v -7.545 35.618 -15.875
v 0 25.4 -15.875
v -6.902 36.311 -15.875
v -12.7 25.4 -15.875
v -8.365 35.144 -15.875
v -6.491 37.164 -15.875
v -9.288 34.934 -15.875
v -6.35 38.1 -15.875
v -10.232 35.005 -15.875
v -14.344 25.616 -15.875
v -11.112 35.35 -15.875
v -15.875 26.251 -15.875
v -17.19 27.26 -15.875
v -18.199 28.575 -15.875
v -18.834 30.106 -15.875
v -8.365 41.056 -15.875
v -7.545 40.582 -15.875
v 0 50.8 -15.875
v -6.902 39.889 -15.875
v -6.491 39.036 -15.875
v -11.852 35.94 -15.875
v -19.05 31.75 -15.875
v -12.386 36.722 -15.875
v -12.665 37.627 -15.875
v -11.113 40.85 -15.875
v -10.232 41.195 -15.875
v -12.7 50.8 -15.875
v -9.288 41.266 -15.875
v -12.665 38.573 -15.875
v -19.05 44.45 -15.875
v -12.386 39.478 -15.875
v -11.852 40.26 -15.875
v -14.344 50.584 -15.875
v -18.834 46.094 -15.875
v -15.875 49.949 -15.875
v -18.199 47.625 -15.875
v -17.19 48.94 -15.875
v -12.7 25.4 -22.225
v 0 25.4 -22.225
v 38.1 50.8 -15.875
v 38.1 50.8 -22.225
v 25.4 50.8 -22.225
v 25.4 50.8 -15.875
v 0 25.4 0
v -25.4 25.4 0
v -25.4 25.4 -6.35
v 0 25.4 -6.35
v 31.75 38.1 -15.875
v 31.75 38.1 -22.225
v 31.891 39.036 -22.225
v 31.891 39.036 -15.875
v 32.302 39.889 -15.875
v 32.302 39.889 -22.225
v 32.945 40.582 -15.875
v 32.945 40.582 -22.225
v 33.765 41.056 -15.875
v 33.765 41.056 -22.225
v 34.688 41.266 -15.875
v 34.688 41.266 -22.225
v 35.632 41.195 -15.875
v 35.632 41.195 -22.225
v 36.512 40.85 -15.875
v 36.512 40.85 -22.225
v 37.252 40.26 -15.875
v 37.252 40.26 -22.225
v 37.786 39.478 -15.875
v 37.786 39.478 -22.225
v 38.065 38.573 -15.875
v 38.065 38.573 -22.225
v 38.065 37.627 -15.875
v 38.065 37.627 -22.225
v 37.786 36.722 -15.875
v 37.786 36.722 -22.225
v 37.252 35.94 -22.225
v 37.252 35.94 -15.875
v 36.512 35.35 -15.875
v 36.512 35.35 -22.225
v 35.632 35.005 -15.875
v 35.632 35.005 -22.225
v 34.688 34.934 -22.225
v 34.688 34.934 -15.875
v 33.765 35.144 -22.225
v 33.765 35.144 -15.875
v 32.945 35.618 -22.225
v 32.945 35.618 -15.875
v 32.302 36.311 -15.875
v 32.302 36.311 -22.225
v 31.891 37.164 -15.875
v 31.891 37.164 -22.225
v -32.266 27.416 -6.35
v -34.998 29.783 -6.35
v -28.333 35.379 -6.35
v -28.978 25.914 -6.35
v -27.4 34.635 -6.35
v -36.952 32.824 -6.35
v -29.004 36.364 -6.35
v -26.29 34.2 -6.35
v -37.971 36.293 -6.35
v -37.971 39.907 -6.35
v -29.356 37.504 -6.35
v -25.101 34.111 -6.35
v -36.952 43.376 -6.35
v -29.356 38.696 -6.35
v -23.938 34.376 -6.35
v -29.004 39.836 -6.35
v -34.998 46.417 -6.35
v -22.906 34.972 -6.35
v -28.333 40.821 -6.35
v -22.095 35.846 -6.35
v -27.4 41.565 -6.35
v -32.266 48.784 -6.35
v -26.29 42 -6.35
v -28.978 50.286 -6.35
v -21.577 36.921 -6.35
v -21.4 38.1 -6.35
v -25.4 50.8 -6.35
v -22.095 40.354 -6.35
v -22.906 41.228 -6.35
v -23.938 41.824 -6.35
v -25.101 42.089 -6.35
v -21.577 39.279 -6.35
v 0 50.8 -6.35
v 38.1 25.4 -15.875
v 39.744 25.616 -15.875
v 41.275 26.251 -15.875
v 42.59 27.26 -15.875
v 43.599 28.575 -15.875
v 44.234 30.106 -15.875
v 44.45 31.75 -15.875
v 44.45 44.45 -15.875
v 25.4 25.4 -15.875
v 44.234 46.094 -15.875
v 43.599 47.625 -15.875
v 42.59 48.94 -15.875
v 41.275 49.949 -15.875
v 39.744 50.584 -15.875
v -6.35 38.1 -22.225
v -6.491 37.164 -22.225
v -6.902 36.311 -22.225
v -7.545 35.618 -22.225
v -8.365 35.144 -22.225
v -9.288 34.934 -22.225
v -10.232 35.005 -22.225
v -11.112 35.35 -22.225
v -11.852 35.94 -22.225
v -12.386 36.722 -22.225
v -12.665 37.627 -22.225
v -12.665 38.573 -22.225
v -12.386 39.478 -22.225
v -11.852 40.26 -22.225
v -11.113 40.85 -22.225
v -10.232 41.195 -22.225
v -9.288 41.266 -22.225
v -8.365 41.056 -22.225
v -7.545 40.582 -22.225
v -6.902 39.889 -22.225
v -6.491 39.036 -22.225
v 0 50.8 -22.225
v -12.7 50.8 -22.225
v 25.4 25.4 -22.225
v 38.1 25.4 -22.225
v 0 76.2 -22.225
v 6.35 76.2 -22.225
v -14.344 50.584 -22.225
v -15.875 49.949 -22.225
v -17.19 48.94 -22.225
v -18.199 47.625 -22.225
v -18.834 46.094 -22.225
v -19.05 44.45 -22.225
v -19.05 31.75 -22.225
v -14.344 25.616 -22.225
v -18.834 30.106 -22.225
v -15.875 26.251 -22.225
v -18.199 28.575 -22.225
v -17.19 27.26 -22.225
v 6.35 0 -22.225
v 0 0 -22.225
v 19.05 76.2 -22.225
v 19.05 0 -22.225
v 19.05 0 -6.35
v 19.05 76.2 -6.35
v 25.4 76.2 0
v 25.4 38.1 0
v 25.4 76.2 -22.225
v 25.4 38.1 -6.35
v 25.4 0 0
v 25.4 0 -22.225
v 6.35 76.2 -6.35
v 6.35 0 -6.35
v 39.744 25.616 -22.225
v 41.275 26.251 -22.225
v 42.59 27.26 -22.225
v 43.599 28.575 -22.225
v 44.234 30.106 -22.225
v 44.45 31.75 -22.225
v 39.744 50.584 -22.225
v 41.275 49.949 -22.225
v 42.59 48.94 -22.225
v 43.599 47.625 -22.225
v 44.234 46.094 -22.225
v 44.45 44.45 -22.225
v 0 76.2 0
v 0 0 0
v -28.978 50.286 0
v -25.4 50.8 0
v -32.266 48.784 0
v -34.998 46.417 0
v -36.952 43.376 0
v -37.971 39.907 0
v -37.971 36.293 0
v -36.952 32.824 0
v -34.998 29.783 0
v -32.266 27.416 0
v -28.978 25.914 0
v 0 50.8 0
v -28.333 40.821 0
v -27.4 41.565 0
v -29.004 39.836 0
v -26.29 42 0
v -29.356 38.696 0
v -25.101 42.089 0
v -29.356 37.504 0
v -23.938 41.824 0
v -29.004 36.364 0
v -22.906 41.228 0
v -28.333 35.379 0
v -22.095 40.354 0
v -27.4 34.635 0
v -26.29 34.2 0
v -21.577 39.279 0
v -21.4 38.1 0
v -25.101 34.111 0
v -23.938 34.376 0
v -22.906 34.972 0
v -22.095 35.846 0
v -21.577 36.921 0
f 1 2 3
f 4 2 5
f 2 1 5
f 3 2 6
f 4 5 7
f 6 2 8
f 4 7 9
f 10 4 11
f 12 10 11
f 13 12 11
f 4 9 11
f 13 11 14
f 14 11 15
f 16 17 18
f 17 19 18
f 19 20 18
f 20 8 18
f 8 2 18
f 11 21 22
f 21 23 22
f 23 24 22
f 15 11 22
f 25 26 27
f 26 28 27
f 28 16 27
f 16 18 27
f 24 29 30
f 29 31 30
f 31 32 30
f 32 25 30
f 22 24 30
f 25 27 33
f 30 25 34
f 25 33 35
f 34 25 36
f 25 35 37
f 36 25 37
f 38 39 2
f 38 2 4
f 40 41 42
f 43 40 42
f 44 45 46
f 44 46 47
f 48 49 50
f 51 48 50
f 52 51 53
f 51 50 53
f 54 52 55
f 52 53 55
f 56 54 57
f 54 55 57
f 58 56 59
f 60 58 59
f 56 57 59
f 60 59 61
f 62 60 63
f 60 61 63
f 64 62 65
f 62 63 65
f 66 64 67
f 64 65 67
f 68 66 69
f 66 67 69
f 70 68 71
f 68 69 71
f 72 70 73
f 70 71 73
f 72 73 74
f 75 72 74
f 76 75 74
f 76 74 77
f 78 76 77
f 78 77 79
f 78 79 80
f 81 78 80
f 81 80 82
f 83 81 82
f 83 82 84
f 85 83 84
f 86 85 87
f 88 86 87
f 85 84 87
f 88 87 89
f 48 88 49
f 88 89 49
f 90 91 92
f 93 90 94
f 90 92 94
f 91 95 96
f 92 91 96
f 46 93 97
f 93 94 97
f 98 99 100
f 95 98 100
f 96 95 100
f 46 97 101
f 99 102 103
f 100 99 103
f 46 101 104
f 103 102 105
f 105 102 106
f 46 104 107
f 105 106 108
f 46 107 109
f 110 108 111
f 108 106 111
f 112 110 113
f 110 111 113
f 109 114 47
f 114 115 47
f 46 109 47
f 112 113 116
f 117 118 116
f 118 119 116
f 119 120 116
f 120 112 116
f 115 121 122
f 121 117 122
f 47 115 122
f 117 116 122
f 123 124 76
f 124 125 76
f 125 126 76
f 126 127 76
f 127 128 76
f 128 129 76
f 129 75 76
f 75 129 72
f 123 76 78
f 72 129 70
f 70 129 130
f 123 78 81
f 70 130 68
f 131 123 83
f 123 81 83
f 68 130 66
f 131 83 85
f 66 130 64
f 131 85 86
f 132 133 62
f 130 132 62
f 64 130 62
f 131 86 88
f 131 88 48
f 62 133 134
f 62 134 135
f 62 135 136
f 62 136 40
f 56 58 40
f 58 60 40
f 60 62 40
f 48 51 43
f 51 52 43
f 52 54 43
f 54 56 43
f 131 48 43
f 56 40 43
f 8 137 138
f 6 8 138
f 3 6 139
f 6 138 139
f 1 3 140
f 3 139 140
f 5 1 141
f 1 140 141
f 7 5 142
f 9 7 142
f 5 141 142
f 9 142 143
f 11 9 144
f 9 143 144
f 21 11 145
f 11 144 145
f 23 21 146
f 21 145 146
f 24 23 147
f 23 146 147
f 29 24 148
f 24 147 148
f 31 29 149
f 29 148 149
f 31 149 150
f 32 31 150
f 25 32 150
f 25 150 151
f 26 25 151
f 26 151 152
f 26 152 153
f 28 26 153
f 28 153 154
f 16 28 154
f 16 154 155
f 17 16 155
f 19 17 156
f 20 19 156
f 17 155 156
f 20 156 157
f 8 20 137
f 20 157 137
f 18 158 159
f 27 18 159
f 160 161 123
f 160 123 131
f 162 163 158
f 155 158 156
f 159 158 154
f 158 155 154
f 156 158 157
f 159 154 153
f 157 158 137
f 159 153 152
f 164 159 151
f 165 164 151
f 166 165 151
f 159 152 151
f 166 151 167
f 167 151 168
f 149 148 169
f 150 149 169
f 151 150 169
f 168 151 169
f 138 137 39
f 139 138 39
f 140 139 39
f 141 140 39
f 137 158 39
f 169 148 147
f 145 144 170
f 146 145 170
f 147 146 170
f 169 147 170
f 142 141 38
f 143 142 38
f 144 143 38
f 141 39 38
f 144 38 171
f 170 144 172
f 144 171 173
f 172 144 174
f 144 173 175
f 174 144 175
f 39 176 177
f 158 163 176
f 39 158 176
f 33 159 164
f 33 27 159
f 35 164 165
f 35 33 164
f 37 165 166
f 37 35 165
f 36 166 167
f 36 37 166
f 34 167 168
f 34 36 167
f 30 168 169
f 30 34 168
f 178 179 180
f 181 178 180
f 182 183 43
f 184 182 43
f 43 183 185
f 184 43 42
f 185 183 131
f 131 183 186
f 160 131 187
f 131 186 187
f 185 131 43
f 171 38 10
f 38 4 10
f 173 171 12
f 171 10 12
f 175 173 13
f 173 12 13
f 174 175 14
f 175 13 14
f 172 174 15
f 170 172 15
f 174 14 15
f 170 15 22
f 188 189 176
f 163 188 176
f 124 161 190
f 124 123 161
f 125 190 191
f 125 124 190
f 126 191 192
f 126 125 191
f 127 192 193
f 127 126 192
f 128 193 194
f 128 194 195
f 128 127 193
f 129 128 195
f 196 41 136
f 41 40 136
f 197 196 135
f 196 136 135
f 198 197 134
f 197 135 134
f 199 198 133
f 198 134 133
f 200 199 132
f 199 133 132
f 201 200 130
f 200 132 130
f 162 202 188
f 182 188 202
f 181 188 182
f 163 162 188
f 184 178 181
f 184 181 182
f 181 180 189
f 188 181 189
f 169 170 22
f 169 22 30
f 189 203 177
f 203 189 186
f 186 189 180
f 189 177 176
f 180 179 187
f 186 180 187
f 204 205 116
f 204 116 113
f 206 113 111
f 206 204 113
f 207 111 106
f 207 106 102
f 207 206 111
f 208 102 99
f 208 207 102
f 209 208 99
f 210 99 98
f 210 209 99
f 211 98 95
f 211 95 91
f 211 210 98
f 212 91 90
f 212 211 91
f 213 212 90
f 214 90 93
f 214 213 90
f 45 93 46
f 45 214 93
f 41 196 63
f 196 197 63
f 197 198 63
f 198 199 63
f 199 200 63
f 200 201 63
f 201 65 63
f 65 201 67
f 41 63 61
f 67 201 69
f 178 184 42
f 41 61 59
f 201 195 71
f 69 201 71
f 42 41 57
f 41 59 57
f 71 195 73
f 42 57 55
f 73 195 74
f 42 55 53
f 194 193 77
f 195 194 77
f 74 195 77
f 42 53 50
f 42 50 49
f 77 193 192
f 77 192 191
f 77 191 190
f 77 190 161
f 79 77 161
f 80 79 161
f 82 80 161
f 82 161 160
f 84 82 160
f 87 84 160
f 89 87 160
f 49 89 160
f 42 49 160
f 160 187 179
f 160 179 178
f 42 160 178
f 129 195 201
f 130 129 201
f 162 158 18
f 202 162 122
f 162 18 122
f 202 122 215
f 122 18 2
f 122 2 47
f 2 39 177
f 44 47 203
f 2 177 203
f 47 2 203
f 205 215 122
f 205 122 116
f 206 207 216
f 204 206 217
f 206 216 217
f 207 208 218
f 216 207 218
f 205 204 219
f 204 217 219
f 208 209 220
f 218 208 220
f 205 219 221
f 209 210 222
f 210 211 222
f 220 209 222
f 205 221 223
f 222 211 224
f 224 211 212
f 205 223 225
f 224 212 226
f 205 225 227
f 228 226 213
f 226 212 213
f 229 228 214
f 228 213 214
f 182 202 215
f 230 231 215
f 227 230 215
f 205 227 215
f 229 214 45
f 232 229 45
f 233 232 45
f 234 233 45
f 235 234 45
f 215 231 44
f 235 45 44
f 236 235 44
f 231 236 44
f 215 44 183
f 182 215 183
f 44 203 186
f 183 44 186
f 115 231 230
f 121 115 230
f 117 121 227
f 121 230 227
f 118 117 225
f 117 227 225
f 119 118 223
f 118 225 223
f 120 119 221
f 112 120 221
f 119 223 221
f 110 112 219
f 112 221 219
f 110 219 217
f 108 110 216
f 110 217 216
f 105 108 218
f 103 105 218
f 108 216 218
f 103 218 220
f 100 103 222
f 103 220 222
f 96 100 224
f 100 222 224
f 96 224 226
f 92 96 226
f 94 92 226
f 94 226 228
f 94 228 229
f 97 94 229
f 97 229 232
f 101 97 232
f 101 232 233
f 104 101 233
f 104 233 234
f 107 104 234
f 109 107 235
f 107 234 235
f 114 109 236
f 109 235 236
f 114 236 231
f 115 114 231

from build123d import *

# Parameters (mm, degrees)
BOSS_EXTRUDE1_DEPTH = 76.2
SKETCH3_R           = 4.0005
BOSS_EXTRUDE2_DEPTH = 6.35
SKETCH4_W           = 19.05
SKETCH4_H           = 25.4
SKETCH4_R           = 3.175
BOSS_EXTRUDE3_DEPTH = 6.35
FILLET1_R           = 6.35


with BuildPart() as part:
    # Sketch2 → Boss-Extrude1 (new body)
    with BuildSketch(Plane(origin=(0, 0, 0), x_dir=(1, 0, 0), z_dir=(0, 1, 0))):
        Polygon((0, 22.225), (0, 0), (25.4, 0), (25.4, 22.225), (19.05, 22.225), (19.05, 6.35), (6.35, 6.35), (6.35, 22.225), align=None)
    extrude(amount=BOSS_EXTRUDE1_DEPTH)

    # Sketch3 → Boss-Extrude2 (add)
    with BuildSketch(Plane.XY):
        with BuildLine():
            Line((12.7, 50.8), (-25.4, 50.8))
            ThreePointArc((-25.4, 50.8), (-38.1, 38.1), (-25.4, 25.4))
            Line((-25.4, 25.4), (12.7, 25.4))
            ThreePointArc((12.7, 25.4), (25.4, 38.1), (12.7, 50.8))
        make_face()
        with Locations((-25.4, 38.1)):
            Circle(SKETCH3_R, mode=Mode.SUBTRACT)
    extrude(amount=-BOSS_EXTRUDE2_DEPTH)

    # Sketch4 → Boss-Extrude3 (add)
    # profile 1 of 2: a face of its own
    with BuildSketch(Plane(origin=(0, 0, -22.225), x_dir=(-1, 0, 0), z_dir=(0, 0, -1))):
        with Locations((-34.925, 38.1)):
            Rectangle(SKETCH4_W, SKETCH4_H)
        with Locations((-34.925, 38.1)):
            Circle(SKETCH4_R, mode=Mode.SUBTRACT)
    # profile 2 of 2: a face of its own
    with BuildSketch(Plane(origin=(0, 0, -22.225), x_dir=(-1, 0, 0), z_dir=(0, 0, -1))):
        with Locations((9.525, 38.1)):
            Rectangle(SKETCH4_W, SKETCH4_H)
        with Locations(Location((9.525, 38.1, 0), (0, 0, 180))):
            Circle(SKETCH4_R, mode=Mode.SUBTRACT)
    extrude(amount=-BOSS_EXTRUDE3_DEPTH)

    # Fillet1
    fillet1_edges = [part.edges().sort_by_distance(p)[0] for p in [
        (44.45, 25.4, -19.05),
        (44.45, 50.8, -19.05),
        (-19.05, 50.8, -19.05),
        (-19.05, 25.4, -19.05),
    ]]
    fillet(fillet1_edges, radius=FILLET1_R)


solid = part.part
